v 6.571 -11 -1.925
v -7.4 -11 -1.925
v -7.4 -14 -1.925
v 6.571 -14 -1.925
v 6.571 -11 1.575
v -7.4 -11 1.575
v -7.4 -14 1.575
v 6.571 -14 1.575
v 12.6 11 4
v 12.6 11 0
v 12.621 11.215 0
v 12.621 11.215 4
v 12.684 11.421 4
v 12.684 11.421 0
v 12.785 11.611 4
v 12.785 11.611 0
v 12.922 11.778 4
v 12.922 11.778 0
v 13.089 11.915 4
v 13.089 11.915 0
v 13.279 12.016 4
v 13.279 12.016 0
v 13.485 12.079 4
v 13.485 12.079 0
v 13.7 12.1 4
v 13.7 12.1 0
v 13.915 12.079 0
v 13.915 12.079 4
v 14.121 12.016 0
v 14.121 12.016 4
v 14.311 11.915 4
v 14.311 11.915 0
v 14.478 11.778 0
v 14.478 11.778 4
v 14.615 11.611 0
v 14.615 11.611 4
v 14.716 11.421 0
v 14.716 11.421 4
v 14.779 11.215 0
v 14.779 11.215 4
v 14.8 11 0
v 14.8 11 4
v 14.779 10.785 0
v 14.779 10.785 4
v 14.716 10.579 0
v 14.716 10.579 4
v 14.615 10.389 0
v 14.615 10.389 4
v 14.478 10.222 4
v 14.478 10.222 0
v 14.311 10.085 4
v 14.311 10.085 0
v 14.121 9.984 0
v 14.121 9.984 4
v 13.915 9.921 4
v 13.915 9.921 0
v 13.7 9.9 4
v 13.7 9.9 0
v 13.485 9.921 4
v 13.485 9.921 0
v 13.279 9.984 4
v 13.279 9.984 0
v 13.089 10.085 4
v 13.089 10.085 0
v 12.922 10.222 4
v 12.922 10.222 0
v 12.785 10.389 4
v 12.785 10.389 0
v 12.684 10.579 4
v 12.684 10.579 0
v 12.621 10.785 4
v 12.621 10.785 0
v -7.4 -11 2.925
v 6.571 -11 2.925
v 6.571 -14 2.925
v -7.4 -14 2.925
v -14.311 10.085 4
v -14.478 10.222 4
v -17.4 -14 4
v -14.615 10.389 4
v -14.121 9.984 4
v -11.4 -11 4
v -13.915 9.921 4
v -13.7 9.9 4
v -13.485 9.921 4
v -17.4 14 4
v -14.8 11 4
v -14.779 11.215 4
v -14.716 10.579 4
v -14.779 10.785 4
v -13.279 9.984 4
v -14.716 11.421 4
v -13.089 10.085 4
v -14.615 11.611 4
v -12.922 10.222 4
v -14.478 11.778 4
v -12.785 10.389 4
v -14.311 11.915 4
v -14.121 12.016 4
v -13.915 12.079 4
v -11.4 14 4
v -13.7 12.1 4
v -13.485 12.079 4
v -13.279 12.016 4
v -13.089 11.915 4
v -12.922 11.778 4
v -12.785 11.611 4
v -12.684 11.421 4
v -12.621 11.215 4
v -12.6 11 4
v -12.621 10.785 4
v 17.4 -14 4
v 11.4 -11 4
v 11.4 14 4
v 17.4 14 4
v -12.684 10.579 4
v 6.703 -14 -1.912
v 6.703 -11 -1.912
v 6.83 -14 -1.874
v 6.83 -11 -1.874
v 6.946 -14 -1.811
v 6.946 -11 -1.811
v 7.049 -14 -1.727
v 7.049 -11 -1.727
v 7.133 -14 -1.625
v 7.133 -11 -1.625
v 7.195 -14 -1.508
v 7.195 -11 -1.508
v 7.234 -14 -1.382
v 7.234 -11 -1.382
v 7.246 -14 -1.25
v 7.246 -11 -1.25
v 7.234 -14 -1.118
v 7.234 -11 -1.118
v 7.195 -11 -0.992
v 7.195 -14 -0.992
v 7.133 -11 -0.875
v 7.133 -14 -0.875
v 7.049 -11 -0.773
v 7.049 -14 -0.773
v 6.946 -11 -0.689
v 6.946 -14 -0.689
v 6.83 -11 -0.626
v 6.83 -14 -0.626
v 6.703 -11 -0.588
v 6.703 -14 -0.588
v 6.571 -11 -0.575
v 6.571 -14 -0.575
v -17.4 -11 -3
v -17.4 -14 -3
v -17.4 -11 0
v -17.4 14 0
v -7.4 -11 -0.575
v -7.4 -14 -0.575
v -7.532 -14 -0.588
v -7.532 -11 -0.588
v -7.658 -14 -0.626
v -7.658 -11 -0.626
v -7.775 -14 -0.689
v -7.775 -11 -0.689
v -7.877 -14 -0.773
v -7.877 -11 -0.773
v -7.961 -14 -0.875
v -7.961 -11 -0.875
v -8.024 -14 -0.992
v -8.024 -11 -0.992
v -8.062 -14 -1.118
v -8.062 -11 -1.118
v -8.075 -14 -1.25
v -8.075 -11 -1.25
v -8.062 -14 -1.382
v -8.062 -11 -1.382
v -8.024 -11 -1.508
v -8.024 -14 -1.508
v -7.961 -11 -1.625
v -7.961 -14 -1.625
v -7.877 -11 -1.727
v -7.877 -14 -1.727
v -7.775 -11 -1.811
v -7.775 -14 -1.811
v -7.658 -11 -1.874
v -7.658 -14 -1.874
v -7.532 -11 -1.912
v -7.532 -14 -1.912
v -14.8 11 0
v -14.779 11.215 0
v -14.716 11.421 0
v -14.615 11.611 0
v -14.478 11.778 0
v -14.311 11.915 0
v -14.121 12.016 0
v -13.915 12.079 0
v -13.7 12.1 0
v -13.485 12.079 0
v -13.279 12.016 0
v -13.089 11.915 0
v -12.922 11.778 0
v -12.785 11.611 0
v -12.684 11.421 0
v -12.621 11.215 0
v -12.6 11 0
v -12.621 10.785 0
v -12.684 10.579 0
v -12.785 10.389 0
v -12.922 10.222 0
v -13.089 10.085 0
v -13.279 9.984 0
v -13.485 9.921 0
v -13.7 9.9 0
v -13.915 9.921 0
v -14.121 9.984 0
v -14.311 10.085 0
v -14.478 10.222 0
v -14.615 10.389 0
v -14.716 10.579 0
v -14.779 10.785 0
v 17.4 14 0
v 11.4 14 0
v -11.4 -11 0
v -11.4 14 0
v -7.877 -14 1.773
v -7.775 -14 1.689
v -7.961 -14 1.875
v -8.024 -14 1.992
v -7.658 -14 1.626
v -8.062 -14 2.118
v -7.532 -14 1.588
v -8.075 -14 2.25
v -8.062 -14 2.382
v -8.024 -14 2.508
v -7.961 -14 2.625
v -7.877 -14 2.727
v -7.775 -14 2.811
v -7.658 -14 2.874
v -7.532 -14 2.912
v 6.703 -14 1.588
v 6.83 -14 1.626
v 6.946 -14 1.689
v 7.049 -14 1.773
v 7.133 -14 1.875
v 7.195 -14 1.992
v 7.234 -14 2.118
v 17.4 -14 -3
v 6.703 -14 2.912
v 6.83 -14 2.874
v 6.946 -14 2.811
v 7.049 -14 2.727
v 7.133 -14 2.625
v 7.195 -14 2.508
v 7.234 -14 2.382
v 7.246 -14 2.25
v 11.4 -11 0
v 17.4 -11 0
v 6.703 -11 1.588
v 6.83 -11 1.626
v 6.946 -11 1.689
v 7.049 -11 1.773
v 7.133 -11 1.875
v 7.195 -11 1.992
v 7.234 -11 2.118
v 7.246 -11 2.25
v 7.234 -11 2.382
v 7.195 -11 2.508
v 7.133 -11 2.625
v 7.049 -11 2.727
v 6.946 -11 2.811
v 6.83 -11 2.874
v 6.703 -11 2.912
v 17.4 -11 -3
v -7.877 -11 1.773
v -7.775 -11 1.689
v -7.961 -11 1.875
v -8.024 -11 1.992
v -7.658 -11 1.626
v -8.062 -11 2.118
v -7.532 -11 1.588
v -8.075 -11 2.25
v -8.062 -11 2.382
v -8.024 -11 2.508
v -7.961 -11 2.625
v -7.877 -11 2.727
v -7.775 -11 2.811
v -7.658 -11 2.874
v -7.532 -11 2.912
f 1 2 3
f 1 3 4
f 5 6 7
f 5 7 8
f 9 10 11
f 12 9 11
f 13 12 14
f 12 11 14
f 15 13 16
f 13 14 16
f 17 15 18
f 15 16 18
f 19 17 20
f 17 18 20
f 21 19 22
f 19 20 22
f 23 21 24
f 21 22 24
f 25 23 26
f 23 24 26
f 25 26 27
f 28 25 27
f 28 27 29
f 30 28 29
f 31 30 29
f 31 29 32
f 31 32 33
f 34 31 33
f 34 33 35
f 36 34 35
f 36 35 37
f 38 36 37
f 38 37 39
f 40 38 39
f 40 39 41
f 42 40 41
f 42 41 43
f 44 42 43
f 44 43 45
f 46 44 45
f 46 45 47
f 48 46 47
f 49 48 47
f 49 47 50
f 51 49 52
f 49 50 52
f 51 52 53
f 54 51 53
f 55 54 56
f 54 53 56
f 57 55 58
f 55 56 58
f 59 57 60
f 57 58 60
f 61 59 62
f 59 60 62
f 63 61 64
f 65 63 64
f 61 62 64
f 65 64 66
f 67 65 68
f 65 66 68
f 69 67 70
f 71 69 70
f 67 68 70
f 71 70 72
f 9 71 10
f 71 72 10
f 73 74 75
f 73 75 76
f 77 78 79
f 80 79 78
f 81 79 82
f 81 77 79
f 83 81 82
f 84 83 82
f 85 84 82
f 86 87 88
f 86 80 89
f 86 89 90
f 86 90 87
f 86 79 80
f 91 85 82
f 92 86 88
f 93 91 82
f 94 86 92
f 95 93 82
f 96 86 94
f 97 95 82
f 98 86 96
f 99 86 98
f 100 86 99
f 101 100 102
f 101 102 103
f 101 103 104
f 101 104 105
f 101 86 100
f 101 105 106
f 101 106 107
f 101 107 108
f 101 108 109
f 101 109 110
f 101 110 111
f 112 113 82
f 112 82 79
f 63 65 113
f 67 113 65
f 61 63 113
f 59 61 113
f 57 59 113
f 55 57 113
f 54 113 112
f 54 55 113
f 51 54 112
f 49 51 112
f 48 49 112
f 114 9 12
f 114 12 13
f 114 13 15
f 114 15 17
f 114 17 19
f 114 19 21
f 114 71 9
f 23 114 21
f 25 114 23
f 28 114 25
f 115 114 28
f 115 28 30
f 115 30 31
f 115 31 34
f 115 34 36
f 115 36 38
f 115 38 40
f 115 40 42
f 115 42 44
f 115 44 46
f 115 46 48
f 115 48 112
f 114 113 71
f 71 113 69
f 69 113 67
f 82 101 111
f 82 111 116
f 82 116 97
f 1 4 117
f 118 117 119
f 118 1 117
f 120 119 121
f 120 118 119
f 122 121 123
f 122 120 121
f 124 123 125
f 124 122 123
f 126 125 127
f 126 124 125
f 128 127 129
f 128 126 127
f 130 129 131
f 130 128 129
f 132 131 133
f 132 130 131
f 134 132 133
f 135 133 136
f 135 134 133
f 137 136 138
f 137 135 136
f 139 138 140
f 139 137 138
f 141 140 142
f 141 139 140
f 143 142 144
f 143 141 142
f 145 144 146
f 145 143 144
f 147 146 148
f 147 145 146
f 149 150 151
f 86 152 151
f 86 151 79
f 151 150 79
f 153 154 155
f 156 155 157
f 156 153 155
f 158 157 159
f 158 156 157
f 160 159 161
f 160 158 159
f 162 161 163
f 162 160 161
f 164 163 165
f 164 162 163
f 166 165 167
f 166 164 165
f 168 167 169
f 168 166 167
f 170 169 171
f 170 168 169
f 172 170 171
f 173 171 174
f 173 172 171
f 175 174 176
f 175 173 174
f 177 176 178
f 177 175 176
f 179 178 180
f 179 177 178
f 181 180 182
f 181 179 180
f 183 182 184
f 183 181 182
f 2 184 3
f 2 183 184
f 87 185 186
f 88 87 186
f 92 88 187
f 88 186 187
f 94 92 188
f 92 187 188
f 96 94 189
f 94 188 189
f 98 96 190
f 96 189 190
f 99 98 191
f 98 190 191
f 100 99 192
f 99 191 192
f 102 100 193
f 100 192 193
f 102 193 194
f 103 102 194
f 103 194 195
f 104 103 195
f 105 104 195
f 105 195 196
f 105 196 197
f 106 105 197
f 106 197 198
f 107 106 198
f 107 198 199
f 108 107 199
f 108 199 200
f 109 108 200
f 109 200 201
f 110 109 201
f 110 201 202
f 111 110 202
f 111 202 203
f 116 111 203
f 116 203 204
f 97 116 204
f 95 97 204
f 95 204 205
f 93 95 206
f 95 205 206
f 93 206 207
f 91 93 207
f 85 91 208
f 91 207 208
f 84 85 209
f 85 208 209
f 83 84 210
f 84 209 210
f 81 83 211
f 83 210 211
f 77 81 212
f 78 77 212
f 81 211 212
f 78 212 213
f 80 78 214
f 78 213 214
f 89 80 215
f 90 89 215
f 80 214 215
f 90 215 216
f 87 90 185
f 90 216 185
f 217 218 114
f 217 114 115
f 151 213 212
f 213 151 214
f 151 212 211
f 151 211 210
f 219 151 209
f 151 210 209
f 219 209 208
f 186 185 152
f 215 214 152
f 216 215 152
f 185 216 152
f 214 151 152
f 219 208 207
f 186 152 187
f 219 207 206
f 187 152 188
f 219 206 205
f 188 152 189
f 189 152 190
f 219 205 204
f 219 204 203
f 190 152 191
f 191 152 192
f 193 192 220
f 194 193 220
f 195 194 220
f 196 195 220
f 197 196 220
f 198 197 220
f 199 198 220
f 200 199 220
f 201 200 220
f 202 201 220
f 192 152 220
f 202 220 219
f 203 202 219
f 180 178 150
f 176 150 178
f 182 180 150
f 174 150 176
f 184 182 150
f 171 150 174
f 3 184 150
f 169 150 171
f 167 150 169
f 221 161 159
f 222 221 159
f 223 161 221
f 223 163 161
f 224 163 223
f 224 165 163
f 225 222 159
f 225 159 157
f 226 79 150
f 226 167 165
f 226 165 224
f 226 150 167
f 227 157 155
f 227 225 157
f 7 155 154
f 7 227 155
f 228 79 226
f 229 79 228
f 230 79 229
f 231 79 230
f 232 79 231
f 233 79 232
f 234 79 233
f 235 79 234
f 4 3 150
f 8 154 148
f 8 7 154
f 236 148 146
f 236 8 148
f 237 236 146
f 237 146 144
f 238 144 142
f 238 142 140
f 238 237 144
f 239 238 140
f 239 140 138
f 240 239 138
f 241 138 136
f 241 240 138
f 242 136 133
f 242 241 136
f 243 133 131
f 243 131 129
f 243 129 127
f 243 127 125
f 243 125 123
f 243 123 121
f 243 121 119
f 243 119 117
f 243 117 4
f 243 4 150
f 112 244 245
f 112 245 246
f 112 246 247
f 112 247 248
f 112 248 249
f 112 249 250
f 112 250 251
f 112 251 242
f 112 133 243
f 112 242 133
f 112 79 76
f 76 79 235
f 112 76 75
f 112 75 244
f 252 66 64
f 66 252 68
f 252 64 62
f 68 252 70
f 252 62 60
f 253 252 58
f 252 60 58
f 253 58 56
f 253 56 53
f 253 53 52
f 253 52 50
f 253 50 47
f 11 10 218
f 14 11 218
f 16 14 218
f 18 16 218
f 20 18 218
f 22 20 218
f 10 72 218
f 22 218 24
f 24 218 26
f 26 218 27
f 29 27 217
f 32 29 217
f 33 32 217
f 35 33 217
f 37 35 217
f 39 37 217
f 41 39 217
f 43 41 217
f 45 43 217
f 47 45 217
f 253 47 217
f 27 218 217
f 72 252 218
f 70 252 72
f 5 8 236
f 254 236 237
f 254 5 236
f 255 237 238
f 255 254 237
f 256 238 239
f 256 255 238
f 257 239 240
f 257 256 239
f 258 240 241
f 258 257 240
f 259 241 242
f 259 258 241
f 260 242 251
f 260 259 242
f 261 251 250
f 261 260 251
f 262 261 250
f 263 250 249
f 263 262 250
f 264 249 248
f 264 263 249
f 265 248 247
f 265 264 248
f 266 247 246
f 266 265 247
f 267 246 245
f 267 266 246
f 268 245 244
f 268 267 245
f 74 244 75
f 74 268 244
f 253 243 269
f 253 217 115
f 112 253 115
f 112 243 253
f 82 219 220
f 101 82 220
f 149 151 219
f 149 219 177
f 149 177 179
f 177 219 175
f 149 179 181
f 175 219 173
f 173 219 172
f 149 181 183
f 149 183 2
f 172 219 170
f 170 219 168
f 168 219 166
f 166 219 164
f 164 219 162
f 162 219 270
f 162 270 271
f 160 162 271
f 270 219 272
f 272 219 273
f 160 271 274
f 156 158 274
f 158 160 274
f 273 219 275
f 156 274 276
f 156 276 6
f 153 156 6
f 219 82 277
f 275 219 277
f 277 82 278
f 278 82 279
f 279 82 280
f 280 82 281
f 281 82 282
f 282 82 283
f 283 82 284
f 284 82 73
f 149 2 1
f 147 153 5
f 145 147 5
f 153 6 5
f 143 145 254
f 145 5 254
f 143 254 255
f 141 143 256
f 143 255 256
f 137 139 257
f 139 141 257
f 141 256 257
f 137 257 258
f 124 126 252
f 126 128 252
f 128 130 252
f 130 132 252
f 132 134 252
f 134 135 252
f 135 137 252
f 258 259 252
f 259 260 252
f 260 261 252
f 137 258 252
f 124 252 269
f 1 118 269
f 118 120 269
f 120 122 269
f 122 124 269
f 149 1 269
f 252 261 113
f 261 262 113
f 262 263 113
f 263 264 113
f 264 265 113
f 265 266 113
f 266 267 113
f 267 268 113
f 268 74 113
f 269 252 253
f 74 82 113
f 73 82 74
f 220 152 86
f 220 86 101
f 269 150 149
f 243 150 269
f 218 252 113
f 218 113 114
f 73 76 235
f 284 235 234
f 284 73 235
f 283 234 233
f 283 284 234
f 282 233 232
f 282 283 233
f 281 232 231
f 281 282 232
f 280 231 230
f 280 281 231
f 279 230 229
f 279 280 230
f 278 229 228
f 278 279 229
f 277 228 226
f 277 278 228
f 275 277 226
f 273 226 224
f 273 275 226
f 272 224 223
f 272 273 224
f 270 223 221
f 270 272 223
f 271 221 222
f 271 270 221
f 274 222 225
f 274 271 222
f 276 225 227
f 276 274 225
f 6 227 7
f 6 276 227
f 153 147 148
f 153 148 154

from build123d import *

# Parameters (mm, degrees)
SKETCH_1_W          = 6
SKETCH_1_H          = 25
SKETCH_1_H_2        = 3
SKETCH_1_W_2        = 22.8
EXTRUDE_1_DEPTH     = 4
SKETCH_3_R          = 1.1
CUT_EXTRUDE_2_DEPTH = 23.688322988
SKETCH_4_W          = 34.8
SKETCH_4_H          = 3
EXTRUDE_2_DEPTH     = 3
CUT_EXTRUDE_3_DEPTH = 31.720677076


with BuildPart() as part:
    # 草图1 → 凸台-拉伸1 (new body)
    with BuildSketch(Plane.XY):
        with Locations((-14.4, 1.5)):
            Rectangle(SKETCH_1_W, SKETCH_1_H)
        with Locations((-14.4, -12.5)):
            Rectangle(SKETCH_1_W, SKETCH_1_H_2)
        with Locations((0, -12.5)):
            Rectangle(SKETCH_1_W_2, SKETCH_1_H_2)
        with Locations((14.4, -12.5)):
            Rectangle(SKETCH_1_W, SKETCH_1_H_2)
        with Locations((14.4, 1.5)):
            Rectangle(SKETCH_1_W, SKETCH_1_H)
    extrude(amount=EXTRUDE_1_DEPTH)

    # 草图3 → 切除-拉伸2 (cut, through all)
    with BuildSketch(Plane(origin=(0, 0, 0), x_dir=(-1, 0, 0), z_dir=(0, 0, -1))):
        with Locations((-13.7, 11)):
            Circle(SKETCH_3_R)
        with Locations((13.7, 11)):
            Circle(SKETCH_3_R)
    extrude(amount=-CUT_EXTRUDE_2_DEPTH, mode=Mode.SUBTRACT)

    # 草图4 → 凸台-拉伸2 (add)
    with BuildSketch(Plane.XZ.offset(14)):
        with Locations((0, -1.5)):
            Rectangle(SKETCH_4_W, SKETCH_4_H)
    extrude(amount=-EXTRUDE_2_DEPTH)

    # 草图5 → 切除-拉伸3 (cut, through all)
    with BuildSketch(Plane(origin=(0, -11, 0), x_dir=(1, 0, 0), z_dir=(0, 1, 0))):
        with BuildLine():
            Line((6.571482936, 0.575), (-7.4, 0.575))
            ThreePointArc((-7.4, 0.575), (-8.075, 1.25), (-7.4, 1.925))
            Line((-7.4, 1.925), (6.571482936, 1.925))
            ThreePointArc((6.571482936, 1.925), (7.246482936, 1.25), (6.571482936, 0.575))
        make_face()
        with BuildLine():
            Line((-7.4, -1.575), (6.571482936, -1.575))
            ThreePointArc((6.571482936, -1.575), (7.246482936, -2.25), (6.571482936, -2.925))
            Line((6.571482936, -2.925), (-7.4, -2.925))
            ThreePointArc((-7.4, -2.925), (-8.075, -2.25), (-7.4, -1.575))
        make_face()
    extrude(amount=-CUT_EXTRUDE_3_DEPTH, mode=Mode.SUBTRACT)


solid = part.part
